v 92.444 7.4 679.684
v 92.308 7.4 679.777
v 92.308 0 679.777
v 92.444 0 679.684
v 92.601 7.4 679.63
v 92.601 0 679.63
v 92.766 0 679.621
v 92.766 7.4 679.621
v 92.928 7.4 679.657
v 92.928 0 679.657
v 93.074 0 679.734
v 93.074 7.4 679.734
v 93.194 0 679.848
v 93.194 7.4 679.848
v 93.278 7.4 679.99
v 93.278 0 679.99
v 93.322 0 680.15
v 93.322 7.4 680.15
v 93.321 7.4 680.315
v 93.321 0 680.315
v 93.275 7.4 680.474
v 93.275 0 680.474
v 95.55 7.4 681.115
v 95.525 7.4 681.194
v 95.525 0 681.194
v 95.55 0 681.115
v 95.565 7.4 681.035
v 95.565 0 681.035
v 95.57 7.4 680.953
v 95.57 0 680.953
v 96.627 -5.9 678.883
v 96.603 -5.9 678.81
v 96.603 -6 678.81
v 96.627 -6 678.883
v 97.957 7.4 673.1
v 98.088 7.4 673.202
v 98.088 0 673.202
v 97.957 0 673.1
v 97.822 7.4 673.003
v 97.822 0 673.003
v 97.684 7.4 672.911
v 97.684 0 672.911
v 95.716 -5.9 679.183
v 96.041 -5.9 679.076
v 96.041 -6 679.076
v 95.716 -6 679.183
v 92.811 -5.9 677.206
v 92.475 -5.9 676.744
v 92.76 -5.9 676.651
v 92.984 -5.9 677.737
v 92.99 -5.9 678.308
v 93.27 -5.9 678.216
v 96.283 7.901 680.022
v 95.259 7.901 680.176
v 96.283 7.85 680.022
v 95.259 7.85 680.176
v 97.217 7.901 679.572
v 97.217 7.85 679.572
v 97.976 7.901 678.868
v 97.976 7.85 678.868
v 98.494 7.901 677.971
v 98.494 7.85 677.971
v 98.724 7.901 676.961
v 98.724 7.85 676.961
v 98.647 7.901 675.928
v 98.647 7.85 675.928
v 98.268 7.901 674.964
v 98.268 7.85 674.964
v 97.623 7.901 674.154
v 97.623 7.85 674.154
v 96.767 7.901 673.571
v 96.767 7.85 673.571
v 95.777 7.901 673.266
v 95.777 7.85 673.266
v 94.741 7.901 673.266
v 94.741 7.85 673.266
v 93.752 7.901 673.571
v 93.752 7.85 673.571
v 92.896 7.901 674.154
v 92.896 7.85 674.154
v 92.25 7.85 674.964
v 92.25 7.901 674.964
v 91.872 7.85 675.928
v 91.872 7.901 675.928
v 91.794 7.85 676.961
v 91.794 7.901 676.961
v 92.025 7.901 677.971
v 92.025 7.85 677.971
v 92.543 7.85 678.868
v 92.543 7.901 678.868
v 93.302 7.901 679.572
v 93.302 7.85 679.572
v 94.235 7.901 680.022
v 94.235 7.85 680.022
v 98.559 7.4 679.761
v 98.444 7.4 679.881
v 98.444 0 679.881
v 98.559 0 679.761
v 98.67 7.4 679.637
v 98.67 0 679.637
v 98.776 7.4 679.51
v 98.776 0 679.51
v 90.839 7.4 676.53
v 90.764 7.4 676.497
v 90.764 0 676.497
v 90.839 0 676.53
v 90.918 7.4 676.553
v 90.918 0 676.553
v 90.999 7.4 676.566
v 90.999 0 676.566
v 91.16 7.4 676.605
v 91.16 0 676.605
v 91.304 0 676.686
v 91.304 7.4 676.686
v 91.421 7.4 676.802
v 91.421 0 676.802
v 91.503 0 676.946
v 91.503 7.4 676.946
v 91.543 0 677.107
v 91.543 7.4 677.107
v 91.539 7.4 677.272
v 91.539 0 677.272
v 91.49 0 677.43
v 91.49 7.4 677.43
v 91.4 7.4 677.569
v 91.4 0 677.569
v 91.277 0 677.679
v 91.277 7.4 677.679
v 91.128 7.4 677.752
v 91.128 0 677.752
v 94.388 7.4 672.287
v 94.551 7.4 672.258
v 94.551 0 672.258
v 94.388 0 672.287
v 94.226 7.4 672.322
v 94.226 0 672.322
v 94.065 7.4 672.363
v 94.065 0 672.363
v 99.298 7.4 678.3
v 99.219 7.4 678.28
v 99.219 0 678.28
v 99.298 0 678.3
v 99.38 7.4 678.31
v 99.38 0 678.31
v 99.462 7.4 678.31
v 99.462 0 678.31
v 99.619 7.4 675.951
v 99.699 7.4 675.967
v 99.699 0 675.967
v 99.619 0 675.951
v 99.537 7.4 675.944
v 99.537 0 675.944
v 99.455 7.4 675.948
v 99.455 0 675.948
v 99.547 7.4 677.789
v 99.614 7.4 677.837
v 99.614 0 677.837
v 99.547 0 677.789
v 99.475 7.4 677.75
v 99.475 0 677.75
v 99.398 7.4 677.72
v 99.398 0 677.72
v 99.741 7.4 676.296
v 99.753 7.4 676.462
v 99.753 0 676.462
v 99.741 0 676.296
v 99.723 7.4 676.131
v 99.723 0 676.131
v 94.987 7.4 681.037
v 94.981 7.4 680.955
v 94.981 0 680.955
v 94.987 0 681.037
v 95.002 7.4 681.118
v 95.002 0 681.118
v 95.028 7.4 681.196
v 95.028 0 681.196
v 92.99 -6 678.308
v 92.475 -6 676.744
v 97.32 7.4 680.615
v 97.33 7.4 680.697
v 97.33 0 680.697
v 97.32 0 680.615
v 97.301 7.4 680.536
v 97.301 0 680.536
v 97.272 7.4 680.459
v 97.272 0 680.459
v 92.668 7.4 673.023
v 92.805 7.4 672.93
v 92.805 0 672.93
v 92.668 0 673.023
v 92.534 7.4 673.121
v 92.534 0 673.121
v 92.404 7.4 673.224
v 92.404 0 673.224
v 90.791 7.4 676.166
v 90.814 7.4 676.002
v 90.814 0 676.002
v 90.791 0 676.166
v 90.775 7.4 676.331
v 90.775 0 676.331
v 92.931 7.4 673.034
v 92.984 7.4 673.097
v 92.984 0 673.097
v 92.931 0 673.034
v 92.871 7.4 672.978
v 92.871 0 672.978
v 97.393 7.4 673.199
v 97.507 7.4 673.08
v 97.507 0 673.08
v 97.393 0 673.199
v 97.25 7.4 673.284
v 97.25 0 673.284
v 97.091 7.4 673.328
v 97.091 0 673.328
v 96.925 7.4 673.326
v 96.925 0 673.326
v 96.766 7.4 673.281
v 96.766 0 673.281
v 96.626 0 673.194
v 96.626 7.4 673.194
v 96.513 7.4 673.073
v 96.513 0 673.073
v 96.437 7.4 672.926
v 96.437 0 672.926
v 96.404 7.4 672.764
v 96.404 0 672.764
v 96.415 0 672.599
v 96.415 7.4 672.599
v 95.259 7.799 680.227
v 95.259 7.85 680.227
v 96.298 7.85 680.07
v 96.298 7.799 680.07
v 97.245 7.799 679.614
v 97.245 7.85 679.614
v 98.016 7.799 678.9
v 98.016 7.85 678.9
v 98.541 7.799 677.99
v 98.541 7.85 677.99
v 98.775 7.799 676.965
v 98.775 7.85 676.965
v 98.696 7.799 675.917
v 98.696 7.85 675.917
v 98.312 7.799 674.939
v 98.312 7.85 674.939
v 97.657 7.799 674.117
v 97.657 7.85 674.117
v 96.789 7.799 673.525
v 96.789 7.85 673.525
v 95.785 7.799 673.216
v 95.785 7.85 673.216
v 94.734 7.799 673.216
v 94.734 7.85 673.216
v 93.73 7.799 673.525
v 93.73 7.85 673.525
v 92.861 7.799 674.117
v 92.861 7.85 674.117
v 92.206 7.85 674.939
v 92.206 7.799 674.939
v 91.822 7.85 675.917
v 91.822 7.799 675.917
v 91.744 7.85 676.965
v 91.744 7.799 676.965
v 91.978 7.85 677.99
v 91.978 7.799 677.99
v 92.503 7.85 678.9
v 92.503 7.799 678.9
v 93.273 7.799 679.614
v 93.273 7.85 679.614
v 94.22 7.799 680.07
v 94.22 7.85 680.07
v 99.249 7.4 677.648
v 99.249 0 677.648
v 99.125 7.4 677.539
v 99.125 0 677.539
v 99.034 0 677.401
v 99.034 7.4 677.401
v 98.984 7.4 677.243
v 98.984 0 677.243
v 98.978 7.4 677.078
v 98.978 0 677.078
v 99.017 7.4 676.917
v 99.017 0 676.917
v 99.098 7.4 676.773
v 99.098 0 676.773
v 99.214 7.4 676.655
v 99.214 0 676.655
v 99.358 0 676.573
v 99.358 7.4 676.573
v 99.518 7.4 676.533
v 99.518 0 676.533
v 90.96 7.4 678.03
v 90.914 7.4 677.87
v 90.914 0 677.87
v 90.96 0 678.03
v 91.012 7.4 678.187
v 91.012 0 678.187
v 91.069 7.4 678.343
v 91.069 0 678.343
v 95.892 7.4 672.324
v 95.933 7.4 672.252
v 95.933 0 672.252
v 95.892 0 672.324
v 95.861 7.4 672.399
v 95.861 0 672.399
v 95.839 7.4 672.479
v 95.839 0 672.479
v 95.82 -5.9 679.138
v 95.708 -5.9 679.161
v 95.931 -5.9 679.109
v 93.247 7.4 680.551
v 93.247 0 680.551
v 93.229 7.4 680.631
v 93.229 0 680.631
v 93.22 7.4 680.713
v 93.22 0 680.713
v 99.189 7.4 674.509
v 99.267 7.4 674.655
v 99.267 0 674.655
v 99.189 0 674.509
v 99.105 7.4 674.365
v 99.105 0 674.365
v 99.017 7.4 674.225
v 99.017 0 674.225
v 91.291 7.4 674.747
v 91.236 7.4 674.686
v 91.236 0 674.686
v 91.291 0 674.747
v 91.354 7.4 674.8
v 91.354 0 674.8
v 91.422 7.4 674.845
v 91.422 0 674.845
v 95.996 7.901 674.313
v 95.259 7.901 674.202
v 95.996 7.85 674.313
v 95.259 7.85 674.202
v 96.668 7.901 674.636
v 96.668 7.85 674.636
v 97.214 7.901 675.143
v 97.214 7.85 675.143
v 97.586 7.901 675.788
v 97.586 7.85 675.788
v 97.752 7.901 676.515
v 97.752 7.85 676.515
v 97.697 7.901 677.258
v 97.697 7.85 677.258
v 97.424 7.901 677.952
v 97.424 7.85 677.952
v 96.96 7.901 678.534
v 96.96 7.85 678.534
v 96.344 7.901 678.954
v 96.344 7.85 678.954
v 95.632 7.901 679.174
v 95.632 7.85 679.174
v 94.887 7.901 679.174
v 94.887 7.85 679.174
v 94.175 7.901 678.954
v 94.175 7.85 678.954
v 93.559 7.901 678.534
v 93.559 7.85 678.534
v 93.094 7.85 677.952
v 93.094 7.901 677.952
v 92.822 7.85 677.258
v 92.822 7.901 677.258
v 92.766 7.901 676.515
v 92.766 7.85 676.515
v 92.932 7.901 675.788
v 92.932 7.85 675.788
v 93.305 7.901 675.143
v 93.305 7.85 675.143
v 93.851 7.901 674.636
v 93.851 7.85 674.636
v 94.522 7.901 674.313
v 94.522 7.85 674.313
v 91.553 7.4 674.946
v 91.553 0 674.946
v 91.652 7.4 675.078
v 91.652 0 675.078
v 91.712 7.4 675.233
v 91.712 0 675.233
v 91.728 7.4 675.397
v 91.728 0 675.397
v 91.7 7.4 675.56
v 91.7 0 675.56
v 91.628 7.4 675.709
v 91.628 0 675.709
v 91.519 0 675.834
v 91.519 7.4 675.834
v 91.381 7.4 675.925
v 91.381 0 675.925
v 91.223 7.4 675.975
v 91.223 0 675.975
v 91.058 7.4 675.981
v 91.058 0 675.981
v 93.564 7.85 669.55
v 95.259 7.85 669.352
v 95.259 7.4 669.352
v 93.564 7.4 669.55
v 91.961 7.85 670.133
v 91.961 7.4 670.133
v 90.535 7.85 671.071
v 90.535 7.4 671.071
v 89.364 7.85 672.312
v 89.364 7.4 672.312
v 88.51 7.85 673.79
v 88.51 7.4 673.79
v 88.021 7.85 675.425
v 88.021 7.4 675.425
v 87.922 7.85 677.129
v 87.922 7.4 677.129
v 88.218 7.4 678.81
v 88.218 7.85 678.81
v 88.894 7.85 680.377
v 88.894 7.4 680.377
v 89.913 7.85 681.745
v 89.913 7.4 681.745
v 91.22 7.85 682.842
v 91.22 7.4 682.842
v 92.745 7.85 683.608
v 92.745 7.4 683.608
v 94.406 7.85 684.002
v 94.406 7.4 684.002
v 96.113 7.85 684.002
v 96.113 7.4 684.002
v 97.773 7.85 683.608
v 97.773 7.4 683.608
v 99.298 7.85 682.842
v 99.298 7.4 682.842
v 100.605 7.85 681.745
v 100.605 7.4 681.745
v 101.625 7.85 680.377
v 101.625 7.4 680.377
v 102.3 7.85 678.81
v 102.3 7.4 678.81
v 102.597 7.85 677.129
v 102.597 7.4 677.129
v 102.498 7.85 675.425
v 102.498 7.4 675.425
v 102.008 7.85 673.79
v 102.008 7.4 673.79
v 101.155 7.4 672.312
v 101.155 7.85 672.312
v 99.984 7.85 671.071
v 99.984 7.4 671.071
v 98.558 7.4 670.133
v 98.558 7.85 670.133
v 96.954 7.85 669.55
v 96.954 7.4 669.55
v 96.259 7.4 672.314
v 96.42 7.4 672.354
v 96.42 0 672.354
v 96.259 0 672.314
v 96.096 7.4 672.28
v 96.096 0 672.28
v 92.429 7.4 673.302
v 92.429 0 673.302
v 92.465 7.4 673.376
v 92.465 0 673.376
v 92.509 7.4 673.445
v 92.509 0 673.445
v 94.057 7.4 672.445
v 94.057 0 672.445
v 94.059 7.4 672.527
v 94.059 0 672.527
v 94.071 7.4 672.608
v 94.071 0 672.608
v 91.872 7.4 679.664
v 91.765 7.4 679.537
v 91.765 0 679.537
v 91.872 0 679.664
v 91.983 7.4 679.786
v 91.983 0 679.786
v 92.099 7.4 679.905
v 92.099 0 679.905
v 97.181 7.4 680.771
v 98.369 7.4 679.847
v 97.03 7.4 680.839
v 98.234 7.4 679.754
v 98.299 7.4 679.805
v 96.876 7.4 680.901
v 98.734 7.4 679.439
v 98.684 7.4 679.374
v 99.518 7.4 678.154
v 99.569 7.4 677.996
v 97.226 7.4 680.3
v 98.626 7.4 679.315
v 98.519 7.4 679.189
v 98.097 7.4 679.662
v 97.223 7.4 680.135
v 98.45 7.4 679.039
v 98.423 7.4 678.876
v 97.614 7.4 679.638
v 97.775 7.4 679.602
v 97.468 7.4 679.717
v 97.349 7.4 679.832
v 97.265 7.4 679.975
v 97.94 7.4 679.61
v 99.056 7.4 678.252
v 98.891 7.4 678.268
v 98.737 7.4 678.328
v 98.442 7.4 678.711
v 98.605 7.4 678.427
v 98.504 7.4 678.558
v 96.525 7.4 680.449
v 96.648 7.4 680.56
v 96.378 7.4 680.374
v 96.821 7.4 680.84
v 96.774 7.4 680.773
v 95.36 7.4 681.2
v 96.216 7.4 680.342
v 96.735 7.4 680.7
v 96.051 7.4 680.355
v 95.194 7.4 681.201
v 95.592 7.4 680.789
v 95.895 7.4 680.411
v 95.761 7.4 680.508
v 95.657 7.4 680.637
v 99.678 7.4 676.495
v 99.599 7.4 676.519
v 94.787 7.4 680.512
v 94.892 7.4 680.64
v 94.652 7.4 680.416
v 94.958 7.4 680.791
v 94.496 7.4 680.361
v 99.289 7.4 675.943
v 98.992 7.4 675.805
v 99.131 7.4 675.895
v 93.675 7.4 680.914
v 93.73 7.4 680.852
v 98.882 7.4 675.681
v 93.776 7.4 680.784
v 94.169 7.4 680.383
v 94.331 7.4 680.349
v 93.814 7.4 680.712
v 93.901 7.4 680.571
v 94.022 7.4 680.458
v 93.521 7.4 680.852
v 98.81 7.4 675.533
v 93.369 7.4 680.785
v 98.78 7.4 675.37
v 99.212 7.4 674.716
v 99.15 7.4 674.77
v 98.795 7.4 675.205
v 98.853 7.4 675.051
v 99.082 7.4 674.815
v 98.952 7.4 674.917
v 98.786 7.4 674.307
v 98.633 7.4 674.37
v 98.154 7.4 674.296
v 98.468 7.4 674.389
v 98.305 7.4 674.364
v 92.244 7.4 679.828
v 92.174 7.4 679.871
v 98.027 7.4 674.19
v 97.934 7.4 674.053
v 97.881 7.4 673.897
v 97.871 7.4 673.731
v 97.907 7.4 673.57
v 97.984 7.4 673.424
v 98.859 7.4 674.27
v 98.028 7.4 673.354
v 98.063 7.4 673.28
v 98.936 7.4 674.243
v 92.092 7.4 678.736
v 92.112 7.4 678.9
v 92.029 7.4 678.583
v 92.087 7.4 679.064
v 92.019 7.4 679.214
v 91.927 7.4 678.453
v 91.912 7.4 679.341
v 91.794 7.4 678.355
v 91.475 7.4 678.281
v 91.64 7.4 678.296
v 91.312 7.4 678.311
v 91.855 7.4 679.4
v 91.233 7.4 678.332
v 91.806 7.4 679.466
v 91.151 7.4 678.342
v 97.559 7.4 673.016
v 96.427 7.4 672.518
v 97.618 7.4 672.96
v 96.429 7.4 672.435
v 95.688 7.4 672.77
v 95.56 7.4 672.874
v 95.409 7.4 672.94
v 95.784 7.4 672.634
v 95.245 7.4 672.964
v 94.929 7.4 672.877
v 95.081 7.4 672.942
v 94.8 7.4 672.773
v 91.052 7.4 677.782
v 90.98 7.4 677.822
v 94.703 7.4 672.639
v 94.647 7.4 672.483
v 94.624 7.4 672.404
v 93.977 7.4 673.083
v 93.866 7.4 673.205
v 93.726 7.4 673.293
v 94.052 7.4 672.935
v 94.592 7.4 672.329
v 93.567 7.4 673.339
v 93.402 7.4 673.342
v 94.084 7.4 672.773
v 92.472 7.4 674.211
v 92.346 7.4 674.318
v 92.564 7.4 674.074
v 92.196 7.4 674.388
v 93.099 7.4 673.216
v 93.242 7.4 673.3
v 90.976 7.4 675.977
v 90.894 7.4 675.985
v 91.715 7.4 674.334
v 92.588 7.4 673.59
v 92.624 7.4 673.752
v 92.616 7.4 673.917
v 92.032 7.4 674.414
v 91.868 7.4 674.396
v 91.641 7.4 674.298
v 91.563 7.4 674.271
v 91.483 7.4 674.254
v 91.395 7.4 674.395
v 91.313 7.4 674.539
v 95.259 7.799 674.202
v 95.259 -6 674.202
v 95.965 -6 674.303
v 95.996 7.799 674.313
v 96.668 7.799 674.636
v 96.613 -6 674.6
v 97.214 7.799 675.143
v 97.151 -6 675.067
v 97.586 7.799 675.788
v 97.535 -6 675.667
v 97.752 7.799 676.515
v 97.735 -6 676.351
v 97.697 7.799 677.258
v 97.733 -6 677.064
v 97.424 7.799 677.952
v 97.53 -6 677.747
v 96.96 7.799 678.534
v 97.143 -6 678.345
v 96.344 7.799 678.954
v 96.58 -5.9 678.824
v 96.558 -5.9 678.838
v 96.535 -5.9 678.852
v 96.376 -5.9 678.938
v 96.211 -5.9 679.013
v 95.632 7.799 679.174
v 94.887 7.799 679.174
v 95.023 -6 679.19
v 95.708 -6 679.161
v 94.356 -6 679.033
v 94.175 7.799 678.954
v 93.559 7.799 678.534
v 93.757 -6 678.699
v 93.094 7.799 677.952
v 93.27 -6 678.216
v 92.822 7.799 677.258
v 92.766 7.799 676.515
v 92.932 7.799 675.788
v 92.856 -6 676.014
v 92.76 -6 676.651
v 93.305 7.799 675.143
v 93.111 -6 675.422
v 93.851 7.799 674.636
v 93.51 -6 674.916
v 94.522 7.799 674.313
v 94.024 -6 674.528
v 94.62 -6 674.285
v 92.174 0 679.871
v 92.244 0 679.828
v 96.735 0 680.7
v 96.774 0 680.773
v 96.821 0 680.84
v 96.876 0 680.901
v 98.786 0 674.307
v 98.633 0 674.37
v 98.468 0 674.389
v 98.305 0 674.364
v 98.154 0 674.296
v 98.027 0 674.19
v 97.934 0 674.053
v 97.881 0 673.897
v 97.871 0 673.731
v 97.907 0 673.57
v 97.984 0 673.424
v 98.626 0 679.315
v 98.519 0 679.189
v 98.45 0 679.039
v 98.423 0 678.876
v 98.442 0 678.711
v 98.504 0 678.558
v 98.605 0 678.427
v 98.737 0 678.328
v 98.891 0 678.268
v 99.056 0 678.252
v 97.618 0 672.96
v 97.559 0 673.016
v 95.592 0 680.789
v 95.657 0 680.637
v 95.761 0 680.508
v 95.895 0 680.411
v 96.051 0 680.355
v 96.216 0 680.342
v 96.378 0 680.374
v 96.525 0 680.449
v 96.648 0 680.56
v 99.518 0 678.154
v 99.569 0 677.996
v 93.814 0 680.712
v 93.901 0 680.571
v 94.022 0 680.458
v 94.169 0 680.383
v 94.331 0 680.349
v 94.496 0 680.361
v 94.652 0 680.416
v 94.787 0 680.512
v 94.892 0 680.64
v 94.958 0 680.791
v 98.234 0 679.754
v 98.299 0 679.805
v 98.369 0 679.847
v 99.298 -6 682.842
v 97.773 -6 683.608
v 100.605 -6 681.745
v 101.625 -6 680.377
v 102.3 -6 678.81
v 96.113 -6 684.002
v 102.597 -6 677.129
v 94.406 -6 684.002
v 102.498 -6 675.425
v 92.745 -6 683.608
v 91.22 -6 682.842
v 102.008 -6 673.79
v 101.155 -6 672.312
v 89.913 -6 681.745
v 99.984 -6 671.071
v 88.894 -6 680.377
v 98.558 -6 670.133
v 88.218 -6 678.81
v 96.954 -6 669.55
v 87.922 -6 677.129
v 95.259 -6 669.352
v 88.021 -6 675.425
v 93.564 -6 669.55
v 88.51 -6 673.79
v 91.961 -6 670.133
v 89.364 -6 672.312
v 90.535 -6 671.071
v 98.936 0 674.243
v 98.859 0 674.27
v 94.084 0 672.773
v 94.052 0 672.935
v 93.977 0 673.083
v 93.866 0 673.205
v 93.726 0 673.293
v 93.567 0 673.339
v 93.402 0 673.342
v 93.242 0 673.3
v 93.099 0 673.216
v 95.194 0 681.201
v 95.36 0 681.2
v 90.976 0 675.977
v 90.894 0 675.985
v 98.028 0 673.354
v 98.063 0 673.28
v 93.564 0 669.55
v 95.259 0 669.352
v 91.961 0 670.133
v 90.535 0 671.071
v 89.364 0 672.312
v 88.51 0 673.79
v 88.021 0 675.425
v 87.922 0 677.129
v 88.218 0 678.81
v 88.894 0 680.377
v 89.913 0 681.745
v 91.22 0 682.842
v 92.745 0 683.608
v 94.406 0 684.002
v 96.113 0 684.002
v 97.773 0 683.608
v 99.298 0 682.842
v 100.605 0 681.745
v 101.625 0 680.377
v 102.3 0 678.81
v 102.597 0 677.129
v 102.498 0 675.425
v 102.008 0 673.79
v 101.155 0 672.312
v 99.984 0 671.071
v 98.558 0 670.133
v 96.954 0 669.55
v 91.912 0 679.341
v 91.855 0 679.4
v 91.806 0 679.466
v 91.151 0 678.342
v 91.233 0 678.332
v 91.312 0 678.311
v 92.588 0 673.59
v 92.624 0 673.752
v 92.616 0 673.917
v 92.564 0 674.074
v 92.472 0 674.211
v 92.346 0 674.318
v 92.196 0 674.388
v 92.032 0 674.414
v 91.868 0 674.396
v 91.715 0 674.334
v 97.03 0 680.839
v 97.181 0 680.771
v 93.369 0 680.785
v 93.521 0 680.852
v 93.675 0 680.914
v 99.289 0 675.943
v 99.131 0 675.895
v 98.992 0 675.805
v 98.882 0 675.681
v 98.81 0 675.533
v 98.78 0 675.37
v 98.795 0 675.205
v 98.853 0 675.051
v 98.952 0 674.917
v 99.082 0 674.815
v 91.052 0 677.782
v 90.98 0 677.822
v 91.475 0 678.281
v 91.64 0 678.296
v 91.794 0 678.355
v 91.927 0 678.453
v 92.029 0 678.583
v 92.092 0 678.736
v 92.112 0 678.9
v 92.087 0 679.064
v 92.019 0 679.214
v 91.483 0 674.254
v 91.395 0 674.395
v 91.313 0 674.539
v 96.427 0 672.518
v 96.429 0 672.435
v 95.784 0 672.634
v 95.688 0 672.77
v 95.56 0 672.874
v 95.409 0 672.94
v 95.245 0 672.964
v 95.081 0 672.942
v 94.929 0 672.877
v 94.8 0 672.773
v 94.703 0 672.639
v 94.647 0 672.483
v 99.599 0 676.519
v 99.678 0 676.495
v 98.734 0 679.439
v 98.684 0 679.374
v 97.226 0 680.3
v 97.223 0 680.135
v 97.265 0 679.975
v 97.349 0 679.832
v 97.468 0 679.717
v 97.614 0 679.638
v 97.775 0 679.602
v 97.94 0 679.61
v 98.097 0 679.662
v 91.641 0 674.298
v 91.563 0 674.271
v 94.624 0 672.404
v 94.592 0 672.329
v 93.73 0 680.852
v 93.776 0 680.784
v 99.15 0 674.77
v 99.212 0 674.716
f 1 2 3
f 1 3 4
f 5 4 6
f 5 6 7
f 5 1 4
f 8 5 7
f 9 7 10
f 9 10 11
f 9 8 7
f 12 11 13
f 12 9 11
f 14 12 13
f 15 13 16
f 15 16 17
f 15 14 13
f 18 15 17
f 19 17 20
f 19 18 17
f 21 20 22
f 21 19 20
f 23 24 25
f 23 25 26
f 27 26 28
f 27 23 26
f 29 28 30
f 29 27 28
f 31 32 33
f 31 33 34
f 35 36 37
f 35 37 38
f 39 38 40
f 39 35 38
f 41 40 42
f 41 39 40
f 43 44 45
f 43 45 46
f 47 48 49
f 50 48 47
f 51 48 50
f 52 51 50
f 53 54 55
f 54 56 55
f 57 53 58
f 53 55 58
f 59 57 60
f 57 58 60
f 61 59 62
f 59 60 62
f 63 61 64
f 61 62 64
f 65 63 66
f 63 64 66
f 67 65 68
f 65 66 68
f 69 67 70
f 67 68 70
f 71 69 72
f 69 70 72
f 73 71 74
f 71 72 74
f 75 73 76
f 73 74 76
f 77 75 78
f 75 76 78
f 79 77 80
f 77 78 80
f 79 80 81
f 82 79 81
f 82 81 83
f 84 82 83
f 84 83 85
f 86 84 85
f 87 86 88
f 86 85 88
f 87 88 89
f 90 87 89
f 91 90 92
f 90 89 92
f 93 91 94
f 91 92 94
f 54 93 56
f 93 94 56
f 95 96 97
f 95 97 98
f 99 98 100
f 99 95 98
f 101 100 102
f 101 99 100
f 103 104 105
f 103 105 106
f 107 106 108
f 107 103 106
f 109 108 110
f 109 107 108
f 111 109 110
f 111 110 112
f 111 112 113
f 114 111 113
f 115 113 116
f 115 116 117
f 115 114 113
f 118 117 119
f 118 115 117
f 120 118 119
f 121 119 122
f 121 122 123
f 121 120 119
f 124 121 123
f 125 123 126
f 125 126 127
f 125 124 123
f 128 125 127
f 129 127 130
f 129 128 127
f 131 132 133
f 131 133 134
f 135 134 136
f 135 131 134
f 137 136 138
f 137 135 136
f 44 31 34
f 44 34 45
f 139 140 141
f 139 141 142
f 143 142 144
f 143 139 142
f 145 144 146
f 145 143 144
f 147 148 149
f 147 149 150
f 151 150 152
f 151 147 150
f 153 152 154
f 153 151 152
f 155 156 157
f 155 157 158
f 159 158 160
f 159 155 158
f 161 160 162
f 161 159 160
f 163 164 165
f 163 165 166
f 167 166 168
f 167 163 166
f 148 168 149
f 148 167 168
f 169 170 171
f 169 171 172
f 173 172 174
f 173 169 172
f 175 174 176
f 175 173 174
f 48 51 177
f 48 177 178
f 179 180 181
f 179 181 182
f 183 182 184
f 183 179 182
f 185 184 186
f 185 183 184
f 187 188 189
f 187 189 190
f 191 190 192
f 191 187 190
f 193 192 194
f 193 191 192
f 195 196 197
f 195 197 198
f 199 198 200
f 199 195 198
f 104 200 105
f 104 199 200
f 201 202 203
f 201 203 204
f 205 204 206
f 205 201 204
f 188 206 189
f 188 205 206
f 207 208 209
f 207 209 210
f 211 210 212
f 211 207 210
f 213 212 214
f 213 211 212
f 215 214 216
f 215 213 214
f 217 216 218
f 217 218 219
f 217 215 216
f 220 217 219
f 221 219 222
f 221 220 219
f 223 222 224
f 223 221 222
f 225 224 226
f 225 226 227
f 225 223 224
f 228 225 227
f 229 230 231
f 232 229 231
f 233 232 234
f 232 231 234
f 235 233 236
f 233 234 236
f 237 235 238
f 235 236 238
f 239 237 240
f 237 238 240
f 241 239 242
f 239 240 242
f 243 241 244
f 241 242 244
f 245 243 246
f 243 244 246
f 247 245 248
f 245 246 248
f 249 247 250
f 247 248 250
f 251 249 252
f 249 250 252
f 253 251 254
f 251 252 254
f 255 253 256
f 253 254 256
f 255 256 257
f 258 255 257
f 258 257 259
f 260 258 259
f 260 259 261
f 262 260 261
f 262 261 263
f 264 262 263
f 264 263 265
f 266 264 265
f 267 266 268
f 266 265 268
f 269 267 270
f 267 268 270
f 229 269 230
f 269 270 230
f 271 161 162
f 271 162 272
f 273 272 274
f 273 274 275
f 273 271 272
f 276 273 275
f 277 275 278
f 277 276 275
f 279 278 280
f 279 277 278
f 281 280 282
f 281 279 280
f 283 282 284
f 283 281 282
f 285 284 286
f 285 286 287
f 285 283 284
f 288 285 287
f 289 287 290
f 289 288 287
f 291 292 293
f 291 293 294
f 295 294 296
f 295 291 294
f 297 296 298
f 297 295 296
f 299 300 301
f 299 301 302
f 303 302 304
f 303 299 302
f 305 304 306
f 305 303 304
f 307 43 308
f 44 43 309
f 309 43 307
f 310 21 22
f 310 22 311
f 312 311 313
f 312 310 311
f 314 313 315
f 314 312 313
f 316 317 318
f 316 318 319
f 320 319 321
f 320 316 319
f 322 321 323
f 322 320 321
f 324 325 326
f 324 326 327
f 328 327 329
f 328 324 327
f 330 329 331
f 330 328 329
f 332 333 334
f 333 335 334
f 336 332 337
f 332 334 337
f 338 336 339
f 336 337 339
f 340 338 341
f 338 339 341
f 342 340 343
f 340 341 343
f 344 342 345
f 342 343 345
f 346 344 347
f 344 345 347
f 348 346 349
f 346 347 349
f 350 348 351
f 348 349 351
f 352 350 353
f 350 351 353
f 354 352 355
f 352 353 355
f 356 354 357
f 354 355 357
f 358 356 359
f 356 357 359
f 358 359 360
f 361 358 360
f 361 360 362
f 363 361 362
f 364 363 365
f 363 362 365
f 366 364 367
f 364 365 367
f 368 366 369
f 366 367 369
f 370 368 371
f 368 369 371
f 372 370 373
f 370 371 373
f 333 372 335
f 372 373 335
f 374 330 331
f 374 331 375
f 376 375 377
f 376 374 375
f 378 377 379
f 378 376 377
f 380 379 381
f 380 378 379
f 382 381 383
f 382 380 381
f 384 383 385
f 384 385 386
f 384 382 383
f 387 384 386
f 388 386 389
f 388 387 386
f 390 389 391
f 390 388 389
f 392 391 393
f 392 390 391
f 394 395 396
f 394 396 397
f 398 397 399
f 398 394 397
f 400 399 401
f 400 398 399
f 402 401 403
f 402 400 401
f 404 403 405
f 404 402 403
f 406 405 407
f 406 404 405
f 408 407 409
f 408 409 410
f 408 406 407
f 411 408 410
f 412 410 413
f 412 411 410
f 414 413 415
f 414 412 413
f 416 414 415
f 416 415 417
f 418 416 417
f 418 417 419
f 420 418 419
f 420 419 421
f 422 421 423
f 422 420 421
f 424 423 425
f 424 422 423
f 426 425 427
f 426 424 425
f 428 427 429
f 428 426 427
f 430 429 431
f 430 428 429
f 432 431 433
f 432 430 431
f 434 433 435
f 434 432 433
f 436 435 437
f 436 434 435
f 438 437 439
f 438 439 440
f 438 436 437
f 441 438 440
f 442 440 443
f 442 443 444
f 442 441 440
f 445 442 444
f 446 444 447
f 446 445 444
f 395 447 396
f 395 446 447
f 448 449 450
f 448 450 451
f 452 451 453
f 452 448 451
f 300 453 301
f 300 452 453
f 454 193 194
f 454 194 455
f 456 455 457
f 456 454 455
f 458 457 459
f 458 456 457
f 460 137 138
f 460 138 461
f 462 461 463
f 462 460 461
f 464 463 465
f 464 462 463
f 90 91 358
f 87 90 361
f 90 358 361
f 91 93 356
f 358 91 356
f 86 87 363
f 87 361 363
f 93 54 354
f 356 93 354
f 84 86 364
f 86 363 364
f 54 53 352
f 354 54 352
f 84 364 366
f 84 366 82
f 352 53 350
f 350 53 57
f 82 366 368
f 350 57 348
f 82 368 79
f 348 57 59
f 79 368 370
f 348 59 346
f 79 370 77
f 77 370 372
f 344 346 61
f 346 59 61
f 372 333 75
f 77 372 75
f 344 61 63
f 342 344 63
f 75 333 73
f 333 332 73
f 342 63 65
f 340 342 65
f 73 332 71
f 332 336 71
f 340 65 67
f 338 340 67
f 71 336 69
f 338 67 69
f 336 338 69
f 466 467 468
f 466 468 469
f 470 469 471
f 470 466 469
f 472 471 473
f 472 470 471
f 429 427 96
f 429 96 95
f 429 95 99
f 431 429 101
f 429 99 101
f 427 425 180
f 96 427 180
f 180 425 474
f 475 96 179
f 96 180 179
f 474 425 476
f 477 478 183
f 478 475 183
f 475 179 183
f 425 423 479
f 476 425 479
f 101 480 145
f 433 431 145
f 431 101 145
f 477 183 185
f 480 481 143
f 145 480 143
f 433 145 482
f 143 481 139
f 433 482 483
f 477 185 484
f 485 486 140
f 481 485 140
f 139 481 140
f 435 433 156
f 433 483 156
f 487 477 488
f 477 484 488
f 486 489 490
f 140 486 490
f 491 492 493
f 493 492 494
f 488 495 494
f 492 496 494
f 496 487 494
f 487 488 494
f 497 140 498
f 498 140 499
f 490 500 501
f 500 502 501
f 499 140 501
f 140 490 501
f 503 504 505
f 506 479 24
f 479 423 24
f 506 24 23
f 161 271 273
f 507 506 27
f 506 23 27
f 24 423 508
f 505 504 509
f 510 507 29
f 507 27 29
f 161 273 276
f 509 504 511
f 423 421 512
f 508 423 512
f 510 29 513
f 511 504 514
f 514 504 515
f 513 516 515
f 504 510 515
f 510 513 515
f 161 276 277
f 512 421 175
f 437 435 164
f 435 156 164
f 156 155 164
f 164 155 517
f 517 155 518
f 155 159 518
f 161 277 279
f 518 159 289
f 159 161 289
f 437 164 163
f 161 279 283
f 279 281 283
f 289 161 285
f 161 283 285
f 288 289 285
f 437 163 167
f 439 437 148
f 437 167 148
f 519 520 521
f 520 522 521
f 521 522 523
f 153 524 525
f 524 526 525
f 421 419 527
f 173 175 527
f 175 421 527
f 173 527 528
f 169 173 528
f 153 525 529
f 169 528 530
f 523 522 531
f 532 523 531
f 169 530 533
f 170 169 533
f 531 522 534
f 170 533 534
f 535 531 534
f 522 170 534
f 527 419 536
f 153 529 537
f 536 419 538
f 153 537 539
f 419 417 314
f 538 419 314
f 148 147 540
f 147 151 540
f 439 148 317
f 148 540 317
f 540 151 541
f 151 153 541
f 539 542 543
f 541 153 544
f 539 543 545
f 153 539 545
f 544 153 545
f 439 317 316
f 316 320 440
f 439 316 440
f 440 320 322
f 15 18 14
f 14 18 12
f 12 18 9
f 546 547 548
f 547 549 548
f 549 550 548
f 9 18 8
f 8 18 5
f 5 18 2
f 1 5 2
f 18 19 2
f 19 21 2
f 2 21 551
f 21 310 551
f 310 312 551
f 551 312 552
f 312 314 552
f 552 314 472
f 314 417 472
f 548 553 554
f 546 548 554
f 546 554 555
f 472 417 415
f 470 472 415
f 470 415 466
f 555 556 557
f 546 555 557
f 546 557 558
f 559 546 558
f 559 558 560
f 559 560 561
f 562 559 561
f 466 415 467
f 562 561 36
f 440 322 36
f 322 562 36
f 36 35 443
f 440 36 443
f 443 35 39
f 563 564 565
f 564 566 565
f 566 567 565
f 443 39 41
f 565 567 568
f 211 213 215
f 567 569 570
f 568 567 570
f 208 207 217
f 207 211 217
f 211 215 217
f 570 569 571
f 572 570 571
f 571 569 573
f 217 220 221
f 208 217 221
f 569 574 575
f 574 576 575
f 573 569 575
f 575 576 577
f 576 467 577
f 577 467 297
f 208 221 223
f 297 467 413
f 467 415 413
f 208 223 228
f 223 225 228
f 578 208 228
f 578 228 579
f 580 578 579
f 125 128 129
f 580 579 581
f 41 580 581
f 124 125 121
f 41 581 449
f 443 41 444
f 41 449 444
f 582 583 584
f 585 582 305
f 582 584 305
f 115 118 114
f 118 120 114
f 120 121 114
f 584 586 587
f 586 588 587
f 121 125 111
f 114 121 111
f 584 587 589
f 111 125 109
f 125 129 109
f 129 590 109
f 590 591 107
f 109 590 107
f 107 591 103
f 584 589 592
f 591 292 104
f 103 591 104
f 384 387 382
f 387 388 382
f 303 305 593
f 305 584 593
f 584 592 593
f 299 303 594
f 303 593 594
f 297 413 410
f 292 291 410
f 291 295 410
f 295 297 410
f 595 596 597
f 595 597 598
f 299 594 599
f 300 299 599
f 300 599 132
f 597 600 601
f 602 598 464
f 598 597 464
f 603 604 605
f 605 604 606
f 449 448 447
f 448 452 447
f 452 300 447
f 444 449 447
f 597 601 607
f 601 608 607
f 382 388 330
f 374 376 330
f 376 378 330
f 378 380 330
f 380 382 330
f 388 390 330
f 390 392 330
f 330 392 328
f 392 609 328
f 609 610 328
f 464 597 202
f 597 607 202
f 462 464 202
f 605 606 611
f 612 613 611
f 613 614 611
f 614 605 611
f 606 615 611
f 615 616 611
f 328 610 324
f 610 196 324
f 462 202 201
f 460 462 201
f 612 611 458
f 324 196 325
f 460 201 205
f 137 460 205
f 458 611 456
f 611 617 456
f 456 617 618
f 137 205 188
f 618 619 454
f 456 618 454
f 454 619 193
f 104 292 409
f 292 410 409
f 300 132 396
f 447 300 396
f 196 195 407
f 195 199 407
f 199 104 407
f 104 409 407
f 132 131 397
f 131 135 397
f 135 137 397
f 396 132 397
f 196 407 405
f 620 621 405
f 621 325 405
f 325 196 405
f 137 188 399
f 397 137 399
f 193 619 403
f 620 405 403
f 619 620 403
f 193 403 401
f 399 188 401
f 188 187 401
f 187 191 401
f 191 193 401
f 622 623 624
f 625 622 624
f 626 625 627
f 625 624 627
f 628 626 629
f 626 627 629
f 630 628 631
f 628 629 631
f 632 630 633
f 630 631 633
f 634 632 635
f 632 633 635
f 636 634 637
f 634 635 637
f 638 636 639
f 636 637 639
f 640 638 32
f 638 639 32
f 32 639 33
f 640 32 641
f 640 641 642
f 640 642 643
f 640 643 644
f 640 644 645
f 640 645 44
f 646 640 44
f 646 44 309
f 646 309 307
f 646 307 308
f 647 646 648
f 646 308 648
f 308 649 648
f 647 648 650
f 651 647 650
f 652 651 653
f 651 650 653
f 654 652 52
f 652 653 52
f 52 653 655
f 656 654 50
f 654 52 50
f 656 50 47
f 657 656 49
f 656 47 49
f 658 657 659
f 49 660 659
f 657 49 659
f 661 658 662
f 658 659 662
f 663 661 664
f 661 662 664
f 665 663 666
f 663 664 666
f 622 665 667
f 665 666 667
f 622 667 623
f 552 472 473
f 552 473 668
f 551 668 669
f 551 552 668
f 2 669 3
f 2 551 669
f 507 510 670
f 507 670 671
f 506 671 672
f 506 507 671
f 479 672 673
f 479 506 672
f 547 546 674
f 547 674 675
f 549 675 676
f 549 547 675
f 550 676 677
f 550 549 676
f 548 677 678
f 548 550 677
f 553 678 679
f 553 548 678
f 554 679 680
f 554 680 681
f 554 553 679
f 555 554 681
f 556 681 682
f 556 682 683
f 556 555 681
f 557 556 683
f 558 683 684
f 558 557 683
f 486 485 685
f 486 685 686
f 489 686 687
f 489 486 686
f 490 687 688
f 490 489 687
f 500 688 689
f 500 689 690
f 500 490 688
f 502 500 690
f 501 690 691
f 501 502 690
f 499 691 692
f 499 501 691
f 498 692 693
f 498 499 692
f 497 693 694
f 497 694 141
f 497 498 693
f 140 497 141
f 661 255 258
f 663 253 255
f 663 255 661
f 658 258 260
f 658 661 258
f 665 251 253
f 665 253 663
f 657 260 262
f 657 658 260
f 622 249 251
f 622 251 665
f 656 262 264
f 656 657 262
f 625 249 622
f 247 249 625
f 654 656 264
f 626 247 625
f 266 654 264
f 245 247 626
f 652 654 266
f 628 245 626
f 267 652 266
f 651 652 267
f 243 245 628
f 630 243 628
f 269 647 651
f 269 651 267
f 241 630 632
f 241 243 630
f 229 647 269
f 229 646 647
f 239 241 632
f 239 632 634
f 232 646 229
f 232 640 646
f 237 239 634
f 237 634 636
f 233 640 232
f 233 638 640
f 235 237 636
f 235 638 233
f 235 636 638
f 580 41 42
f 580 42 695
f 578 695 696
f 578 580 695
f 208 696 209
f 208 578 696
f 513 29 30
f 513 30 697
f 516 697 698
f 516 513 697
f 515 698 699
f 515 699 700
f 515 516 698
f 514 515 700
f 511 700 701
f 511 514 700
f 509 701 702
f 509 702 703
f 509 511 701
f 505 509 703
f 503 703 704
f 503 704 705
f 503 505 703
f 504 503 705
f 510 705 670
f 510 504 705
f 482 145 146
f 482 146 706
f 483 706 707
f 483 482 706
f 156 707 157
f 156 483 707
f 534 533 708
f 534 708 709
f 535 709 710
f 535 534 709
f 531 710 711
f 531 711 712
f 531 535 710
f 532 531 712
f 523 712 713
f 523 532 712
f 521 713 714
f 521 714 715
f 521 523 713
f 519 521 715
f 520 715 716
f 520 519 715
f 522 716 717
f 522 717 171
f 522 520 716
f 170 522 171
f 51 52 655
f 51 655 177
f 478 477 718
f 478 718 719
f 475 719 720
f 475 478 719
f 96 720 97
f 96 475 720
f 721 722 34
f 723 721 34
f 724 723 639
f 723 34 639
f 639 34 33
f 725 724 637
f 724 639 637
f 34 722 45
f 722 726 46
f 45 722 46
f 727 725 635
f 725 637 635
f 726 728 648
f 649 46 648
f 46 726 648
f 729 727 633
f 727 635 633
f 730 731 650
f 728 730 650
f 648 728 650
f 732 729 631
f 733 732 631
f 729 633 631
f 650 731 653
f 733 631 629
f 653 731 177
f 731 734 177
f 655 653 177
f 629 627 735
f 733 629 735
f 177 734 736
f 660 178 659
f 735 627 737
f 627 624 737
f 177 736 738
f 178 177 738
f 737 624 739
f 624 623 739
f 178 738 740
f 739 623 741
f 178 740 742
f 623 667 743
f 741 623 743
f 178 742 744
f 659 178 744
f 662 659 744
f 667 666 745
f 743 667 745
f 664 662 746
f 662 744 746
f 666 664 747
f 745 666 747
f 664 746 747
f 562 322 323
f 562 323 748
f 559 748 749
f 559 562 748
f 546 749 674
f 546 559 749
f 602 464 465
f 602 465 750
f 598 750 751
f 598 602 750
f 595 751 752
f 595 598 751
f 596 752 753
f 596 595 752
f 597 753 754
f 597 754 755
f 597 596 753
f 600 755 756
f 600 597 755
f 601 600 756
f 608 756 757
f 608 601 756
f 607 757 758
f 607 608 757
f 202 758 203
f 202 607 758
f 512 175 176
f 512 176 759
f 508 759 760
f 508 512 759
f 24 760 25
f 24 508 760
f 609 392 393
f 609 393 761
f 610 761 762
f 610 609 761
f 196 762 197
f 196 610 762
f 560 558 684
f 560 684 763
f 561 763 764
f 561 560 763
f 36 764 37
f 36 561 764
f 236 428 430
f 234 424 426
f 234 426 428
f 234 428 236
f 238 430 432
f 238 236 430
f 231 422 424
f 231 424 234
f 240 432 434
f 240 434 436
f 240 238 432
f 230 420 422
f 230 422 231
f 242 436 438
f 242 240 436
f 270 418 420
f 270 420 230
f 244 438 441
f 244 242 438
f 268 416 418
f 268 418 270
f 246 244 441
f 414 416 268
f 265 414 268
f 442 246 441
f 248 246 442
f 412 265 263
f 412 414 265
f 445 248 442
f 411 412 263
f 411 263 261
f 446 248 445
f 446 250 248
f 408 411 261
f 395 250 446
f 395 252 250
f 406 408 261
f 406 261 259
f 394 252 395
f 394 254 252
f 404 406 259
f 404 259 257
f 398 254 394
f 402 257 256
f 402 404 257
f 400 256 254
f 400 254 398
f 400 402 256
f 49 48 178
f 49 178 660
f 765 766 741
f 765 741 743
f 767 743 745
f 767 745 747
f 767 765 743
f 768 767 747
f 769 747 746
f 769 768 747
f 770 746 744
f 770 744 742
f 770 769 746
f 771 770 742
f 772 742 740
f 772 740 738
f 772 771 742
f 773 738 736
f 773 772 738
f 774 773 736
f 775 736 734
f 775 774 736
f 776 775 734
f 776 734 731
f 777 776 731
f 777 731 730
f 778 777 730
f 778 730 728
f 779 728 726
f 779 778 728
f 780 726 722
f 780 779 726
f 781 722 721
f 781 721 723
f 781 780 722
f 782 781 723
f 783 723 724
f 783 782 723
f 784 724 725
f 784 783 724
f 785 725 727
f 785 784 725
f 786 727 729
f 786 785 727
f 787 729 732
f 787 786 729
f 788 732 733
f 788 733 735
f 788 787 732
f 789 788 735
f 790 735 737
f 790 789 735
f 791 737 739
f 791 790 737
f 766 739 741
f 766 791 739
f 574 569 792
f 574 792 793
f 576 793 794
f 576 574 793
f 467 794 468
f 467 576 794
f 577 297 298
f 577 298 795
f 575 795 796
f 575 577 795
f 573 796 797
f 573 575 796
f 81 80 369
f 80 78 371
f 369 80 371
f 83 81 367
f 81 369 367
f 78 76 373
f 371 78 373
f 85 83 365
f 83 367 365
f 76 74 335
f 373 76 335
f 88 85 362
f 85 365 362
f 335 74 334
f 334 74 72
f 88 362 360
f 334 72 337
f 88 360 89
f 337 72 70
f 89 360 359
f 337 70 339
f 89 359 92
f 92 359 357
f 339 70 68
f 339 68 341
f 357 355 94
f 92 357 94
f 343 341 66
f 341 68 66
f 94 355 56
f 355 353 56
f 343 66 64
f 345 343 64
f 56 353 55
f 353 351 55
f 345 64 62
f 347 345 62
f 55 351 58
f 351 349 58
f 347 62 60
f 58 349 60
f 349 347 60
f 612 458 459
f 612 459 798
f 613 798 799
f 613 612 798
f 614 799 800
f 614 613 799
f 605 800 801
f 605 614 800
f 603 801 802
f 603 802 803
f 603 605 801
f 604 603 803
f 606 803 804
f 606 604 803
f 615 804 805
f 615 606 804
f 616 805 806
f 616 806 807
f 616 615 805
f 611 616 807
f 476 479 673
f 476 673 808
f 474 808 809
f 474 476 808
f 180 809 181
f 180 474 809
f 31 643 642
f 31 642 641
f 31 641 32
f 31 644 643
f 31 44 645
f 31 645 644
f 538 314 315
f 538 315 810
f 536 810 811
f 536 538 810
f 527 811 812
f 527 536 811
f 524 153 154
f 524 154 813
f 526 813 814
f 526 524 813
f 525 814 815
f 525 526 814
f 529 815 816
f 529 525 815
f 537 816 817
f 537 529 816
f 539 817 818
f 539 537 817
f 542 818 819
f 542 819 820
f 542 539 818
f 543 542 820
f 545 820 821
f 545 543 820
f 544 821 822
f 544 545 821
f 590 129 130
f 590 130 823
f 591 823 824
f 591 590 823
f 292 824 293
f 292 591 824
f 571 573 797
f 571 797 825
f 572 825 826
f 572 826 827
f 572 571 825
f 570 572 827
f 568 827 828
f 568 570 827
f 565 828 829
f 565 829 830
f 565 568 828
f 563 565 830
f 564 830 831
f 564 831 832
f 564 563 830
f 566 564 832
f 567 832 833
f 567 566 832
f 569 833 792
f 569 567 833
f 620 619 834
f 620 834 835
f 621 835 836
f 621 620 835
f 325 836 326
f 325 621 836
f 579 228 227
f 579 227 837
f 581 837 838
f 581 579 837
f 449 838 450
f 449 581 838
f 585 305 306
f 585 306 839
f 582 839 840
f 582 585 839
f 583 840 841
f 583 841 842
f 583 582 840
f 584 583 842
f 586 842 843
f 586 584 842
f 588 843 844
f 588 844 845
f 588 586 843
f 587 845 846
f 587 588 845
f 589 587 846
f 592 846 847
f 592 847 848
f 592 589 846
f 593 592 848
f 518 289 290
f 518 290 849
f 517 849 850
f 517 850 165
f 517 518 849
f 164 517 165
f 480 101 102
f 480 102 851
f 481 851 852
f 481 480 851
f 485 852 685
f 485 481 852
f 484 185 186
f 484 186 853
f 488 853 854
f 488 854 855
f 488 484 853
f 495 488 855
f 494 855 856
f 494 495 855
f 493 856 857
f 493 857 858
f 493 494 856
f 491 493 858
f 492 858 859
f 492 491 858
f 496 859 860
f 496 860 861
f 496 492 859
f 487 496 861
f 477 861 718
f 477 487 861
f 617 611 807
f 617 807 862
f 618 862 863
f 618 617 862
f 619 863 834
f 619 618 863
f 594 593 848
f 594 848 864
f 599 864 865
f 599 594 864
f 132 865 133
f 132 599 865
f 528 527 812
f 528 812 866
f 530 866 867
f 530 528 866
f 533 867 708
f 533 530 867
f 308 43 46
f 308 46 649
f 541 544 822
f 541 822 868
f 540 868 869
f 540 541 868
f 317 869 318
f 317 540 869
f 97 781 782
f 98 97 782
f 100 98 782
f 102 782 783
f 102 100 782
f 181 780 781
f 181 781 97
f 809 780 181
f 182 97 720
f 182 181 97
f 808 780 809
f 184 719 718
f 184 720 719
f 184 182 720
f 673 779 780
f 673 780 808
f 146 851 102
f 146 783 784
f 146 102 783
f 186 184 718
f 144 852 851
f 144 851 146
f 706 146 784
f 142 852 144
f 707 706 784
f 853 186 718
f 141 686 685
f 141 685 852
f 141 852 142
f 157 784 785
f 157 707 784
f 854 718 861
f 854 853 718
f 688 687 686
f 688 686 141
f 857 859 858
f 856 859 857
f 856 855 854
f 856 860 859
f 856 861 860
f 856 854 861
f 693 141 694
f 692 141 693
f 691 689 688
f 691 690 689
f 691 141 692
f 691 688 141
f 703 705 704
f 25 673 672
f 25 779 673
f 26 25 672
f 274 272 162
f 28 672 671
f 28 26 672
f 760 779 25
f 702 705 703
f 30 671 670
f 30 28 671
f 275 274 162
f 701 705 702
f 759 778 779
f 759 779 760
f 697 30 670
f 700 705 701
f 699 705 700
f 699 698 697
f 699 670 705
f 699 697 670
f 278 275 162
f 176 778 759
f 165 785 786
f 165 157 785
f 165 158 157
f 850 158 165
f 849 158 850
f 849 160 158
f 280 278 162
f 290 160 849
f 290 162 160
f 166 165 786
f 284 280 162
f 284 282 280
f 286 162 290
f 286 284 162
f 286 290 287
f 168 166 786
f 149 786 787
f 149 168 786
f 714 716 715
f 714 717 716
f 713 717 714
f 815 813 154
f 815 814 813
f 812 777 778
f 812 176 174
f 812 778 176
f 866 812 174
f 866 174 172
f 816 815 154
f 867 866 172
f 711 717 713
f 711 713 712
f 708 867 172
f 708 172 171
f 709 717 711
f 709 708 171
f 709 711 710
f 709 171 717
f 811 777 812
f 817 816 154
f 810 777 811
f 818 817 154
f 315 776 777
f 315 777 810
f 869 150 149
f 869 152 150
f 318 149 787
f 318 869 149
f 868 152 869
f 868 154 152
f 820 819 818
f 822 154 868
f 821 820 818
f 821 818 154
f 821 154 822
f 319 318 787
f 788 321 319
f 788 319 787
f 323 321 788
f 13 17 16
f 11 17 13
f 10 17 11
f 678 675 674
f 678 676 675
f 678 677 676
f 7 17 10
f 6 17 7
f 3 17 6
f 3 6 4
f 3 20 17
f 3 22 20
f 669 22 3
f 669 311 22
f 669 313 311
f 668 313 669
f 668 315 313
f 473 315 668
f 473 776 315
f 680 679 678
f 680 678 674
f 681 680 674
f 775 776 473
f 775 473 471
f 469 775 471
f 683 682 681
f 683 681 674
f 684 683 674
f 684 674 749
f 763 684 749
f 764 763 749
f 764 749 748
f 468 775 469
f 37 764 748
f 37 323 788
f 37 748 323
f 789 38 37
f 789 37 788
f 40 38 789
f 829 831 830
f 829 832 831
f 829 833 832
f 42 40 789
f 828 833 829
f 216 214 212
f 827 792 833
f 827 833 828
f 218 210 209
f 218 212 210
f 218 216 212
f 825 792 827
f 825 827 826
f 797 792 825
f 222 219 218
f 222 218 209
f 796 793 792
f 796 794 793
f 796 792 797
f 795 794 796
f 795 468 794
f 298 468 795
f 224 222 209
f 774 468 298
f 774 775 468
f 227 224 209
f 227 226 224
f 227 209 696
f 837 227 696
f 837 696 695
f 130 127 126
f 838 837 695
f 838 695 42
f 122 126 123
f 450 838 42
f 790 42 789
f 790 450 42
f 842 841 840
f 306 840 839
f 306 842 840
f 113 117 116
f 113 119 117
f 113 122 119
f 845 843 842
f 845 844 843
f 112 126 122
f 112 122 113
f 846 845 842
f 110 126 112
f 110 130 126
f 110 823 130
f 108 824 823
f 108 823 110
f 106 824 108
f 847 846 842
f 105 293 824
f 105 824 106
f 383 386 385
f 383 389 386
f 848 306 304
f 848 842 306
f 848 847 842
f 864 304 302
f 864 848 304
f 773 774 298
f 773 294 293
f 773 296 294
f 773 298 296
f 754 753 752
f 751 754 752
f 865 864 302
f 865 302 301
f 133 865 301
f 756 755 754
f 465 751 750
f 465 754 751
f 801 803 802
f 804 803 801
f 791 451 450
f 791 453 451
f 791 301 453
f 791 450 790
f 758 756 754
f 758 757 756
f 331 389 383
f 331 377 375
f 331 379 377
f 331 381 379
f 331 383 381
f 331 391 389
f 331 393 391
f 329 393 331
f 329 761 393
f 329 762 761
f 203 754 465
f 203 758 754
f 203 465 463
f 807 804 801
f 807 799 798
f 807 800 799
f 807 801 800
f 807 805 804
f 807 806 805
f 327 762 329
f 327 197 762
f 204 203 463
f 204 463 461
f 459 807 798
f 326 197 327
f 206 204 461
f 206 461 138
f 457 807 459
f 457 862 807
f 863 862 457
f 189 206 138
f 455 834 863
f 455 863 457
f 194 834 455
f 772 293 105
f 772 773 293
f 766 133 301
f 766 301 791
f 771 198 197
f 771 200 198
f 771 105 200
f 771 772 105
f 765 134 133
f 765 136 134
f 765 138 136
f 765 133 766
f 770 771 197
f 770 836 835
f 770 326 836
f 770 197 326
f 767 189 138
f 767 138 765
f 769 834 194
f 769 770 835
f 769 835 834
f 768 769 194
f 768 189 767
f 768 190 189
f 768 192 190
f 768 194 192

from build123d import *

# Parameters (mm, degrees)
BOSS_EXTRUDE1_DEPTH = 7.4
SKETCH2_R           = 7.35
BOSS_EXTRUDE2_DEPTH = 6
BOSS_EXTRUDE3_DEPTH = 1.5
CUT_EXTRUDE1_START  = -0.1
CUT_EXTRUDE1_DEPTH  = 0.1
CUT_EXTRUDE2_START  = -1.6
CUT_EXTRUDE2_DEPTH  = 1.6
CUT_EXTRUDE3_START  = -13.4
CUT_EXTRUDE3_DEPTH  = 13.4
CUT_EXTRUDE4_START  = -0.1
CUT_EXTRUDE4_DEPTH  = 0.1
BOSS_EXTRUDE4_START = 0.45
SKETCH8_R           = 7.35
BOSS_EXTRUDE4_DEPTH = 0.45
SKETCH9_R           = 3.5254
CUT_EXTRUDE5_DEPTH  = 0.0508
SKETCH13_R          = 2.5
CUT_EXTRUDE6_DEPTH  = 692.982195909


with BuildPart() as part:
    # Sketch1 → Boss-Extrude1 (new body)
    with BuildSketch(Plane.XZ.offset(-7.4)):
        with BuildLine():
            ThreePointArc((91.128150208, 677.751658944), (91.015370064, 677.800914334), (90.913687093, 677.870239853))
            ThreePointArc((90.913687093, 677.870239853), (90.984932811, 678.108661471), (91.069248689, 678.342780358))
            ThreePointArc((91.069248689, 678.342780358), (91.192228282, 678.338146361), (91.312212717, 678.310775031))
            ThreePointArc((91.312212717, 678.310775031), (92.029327433, 678.583047694), (91.912427908, 679.341150867))
            ThreePointArc((91.912427908, 679.341150867), (91.829432093, 679.432019722), (91.764737305, 679.536709925))
            ThreePointArc((91.764737305, 679.536709925), (91.926798315, 679.725540668), (92.099049433, 679.905124556))
            ThreePointArc((92.099049433, 679.905124556), (92.209512065, 679.850870882), (92.307990377, 679.777063862))
            ThreePointArc((92.307990377, 679.777063862), (93.073850539, 679.734120484), (93.275405848, 680.474229514))
            ThreePointArc((93.275405848, 680.474229514), (93.236545091, 680.590999784), (93.220024803, 680.712952784))
            ThreePointArc((93.220024803, 680.712952784), (93.444879286, 680.8195421), (93.67528186, 680.913539304))
            ThreePointArc((93.67528186, 680.913539304), (93.754127538, 680.819046906), (93.814071933, 680.7115661))
            ThreePointArc((93.814071933, 680.7115661), (94.496253359, 680.360831981), (94.981412759, 680.954975294))
            ThreePointArc((94.981412759, 680.954975294), (94.993406438, 681.077456337), (95.027917159, 681.195585353))
            ThreePointArc((95.027917159, 681.195585353), (95.27668573, 681.201502981), (95.525401062, 681.19366053))
            ThreePointArc((95.525401062, 681.19366053), (95.558996653, 681.075268003), (95.570042201, 680.952697819))
            ThreePointArc((95.570042201, 680.952697819), (96.050589526, 680.354818074), (96.735464548, 680.700262893))
            ThreePointArc((96.735464548, 680.700262893), (96.796238848, 680.807276625), (96.875813359, 680.901156076))
            ThreePointArc((96.875813359, 680.901156076), (97.105481674, 680.805378805), (97.329504623, 680.69705273))
            ThreePointArc((97.329504623, 680.69705273), (97.312041144, 680.575231217), (97.272277968, 680.458765153))
            ThreePointArc((97.272277968, 680.458765153), (97.468100194, 679.717118622), (98.234269726, 679.7541344))
            ThreePointArc((98.234269726, 679.7541344), (98.333316217, 679.827177174), (98.444195363, 679.880574451))
            ThreePointArc((98.444195363, 679.880574451), (98.615051683, 679.69966304), (98.775646647, 679.509583904))
            ThreePointArc((98.775646647, 679.509583904), (98.710143691, 679.405397451), (98.626447207, 679.315173548))
            ThreePointArc((98.626447207, 679.315173548), (98.503684891, 678.557997654), (99.218671261, 678.280184026))
            ThreePointArc((99.218671261, 678.280184026), (99.338863905, 678.306626083), (99.461875675, 678.310308312))
            ThreePointArc((99.461875675, 678.310308312), (99.54437739, 678.075543988), (99.61377604, 677.8365782))
            ThreePointArc((99.61377604, 677.8365782), (99.511559664, 677.768041591), (99.398401753, 677.719660382))
            ThreePointArc((99.398401753, 677.719660382), (98.978281617, 677.077877715), (99.518457184, 676.533271182))
            ThreePointArc((99.518457184, 676.533271182), (99.639013582, 676.50854045), (99.752888122, 676.461870939))
            ThreePointArc((99.752888122, 676.461870939), (99.732769937, 676.213846587), (99.698972616, 675.967313503))
            ThreePointArc((99.698972616, 675.967313503), (99.57771696, 675.946277341), (99.454663654, 675.948104375))
            ThreePointArc((99.454663654, 675.948104375), (98.809828284, 675.53268499), (99.081791786, 674.815452968))
            ThreePointArc((99.081791786, 674.815452968), (99.181866641, 674.743825616), (99.26691401, 674.654873947))
            ThreePointArc((99.26691401, 674.654873947), (99.147654541, 674.43647523), (99.016505113, 674.22500266))
            ThreePointArc((99.016505113, 674.22500266), (98.897176381, 674.255104288), (98.785504714, 674.306823656))
            ThreePointArc((98.785504714, 674.306823656), (98.027452004, 674.189597337), (97.984178482, 673.423755759))
            ThreePointArc((97.984178482, 673.423755759), (98.046467943, 673.317616806), (98.087982677, 673.201763533))
            ThreePointArc((98.087982677, 673.201763533), (97.890202969, 673.050753573), (97.684378362, 672.910907045))
            ThreePointArc((97.684378362, 672.910907045), (97.587609576, 672.986941619), (97.506628594, 673.079610571))
            ThreePointArc((97.506628594, 673.079610571), (96.766432745, 673.280846814), (96.415404583, 672.598816647))
            ThreePointArc((96.415404583, 672.598816647), (96.429138235, 672.476518482), (96.41994206, 672.353795687))
            ThreePointArc((96.41994206, 672.353795687), (96.177840023, 672.296285478), (95.93292918, 672.252245728))
            ThreePointArc((95.93292918, 672.252245728), (95.875452543, 672.361066178), (95.839164593, 672.478661412))
            ThreePointArc((95.839164593, 672.478661412), (95.244812192, 672.963564642), (94.646725348, 672.483275097))
            ThreePointArc((94.646725348, 672.483275097), (94.609528519, 672.365964185), (94.551211537, 672.257591754))
            ThreePointArc((94.551211537, 672.257591754), (94.306648812, 672.303525334), (94.064999043, 672.362907234))
            ThreePointArc((94.064999043, 672.362907234), (94.056752787, 672.485697517), (94.071432386, 672.607885747))
            ThreePointArc((94.071432386, 672.607885747), (93.725692361, 673.292611791), (92.983961485, 673.097109294))
            ThreePointArc((92.983961485, 673.097109294), (92.902265844, 673.005069757), (92.804911591, 672.929786268))
            ThreePointArc((92.804911591, 672.929786268), (92.600175295, 673.071221303), (92.403570041, 673.223757184))
            ThreePointArc((92.403570041, 673.223757184), (92.445980018, 673.339285743), (92.50908893, 673.444939515))
            ThreePointArc((92.50908893, 673.444939515), (92.471742874, 674.21109302), (91.714619971, 674.334181729))
            ThreePointArc((91.714619971, 674.334181729), (91.602551437, 674.283328038), (91.482993348, 674.25415069))
            ThreePointArc((91.482993348, 674.25415069), (91.353484246, 674.466631779), (91.235918342, 674.6859468))
            ThreePointArc((91.235918342, 674.6859468), (91.321651482, 674.774237699), (91.422277602, 674.845088516))
            ThreePointArc((91.422277602, 674.845088516), (91.699782987, 675.560194579), (91.058181486, 675.980591338))
            ThreePointArc((91.058181486, 675.980591338), (90.935117726, 675.979716559), (90.814028481, 676.001690381))
            ThreePointArc((90.814028481, 676.001690381), (90.782139874, 676.248477612), (90.763941532, 676.496650215))
            ThreePointArc((90.763941532, 676.496650215), (90.878173797, 676.542437155), (90.998917955, 676.566234267))
            ThreePointArc((90.998917955, 676.566234267), (91.543291578, 677.106644554), (91.128150208, 677.751658944))
        make_face()
    extrude(amount=BOSS_EXTRUDE1_DEPTH)

    # Sketch2 → Boss-Extrude2 (add)
    with BuildSketch(Plane(origin=(0, 0, 0), x_dir=(1, 0, 0), z_dir=(0, 1, 0))):
        with Locations(Location((95.259274839, -676.701536663, 0), (0, 0, 90))):
            Circle(SKETCH2_R)
    extrude(amount=-BOSS_EXTRUDE2_DEPTH)

    # Sketch3 → Boss-Extrude3 (add)
    with BuildSketch(Plane.XZ.offset(6)):
        with BuildLine():
            Line((96.041010843, 679.076171124), (96.626778532, 678.883334837))
            Line((96.626778532, 678.883334837), (96.602621135, 678.809953303))
            ThreePointArc((96.602621135, 678.809953303), (94.188428595, 674.442490776), (96.041010843, 679.076171124))
        make_face()
    extrude(amount=BOSS_EXTRUDE3_DEPTH)

    # Sketch4 → Cut-Extrude1 (cut)
    with BuildSketch(Plane.XZ.offset(6).offset(CUT_EXTRUDE1_START)):
        with BuildLine():
            Line((93.270250047, 678.216059815), (92.990087847, 678.30828996))
            Line((92.990087847, 678.30828996), (92.475234347, 676.744349121))
            Line((92.475234347, 676.744349121), (92.759792338, 676.650671871))
            ThreePointArc((92.759792338, 676.650671871), (92.882452531, 677.476595188), (93.270250047, 678.216059815))
        make_face()
    extrude(amount=CUT_EXTRUDE1_DEPTH, mode=Mode.SUBTRACT)

    # Sketch5 → Cut-Extrude2 (cut)
    with BuildSketch(Plane.XZ.offset(7.5).offset(CUT_EXTRUDE2_START)):
        with BuildLine():
            Line((96.602621135, 678.809953303), (96.626778532, 678.883334837))
            Line((96.626778532, 678.883334837), (96.041010843, 679.076171124))
            ThreePointArc((96.041010843, 679.076171124), (94.987937535, 679.186768256), (93.983539757, 678.851536663))
            Line((93.983539757, 678.851536663), (96.535009921, 678.851536663))
            ThreePointArc((96.535009921, 678.851536663), (96.568980573, 678.831013334), (96.602621135, 678.809953303))
        make_face()
    extrude(amount=CUT_EXTRUDE2_DEPTH, mode=Mode.SUBTRACT)

    # Sketch6 → Cut-Extrude3 (cut)
    with BuildSketch(Plane.XZ.offset(5.9).offset(CUT_EXTRUDE3_START)):
        with BuildLine():
            Line((93.983539757, 678.851536663), (96.535009921, 678.851536663))
            ThreePointArc((96.535009921, 678.851536663), (95.259274839, 679.201536663), (93.983539757, 678.851536663))
        make_face()
    extrude(amount=CUT_EXTRUDE3_DEPTH, mode=Mode.SUBTRACT)

    # Sketch7 → Cut-Extrude4 (cut)
    with BuildSketch(Plane.XZ.offset(6).offset(CUT_EXTRUDE4_START)):
        with BuildLine():
            Line((96.041010843, 679.076171124), (95.715643525, 679.183282914))
            Line((95.715643525, 679.183282914), (95.708270643, 679.160886734))
            ThreePointArc((95.708270643, 679.160886734), (95.876096839, 679.124248083), (96.041010843, 679.076171124))
        make_face()
    extrude(amount=CUT_EXTRUDE4_DEPTH, mode=Mode.SUBTRACT)

    # Sketch8 → Boss-Extrude4 (add)
    with BuildSketch(Plane(origin=(0, 7.4, 0), x_dir=(-1, 0, 0), z_dir=(0, 1, 0)).offset(BOSS_EXTRUDE4_START)):
        with Locations(Location((-95.259274839, 676.701536663, 0), (0, 0, 270))):
            Circle(SKETCH8_R)
    extrude(amount=-BOSS_EXTRUDE4_DEPTH)

    # Sketch9 → Cut-Extrude5 (cut)
    with BuildSketch(Plane(origin=(0, 7.85, 0), x_dir=(1, 0, 0), z_dir=(0, 1, 0))):
        with Locations(Location((95.259274839, -676.701536663, 0), (0, 0, 270))):
            Circle(SKETCH9_R)
    extrude(amount=-CUT_EXTRUDE5_DEPTH, mode=Mode.SUBTRACT)


with BuildPart() as body_2:
    # Sketch10 → Revolve1 (revolve)
    with BuildSketch(Plane(origin=(0, 0, 676.701536663), x_dir=(-1, 0, 0), z_dir=(0, 0, -1)), mode=Mode.PRIVATE) as revolve1_sk:
        Polygon((-98.733874839, 7.85), (-95.259274839, 7.85), (-95.259274839, 12.1008), (-97.759274839, 12.1008), (-97.759274839, 7.9008), (-98.733874839, 7.9008), align=None)
    revolve(revolve1_sk.sketch.rotate(Axis((95.259274839, 7.85, 676.701536663), (0, 1, 0)), 270), axis=Axis((95.259274839, 7.85, 676.701536663), (0, 1, 0)))


with BuildPart() as cut_extrude6_tool:
    # Sketch13 → Cut-Extrude6 (new, through all)
    with BuildSketch(Plane.XZ.offset(7.5)):
        with Locations(Location((95.259274839, 676.701536663, 0), (0, 0, 270))):
            Circle(SKETCH13_R)
    extrude(amount=-CUT_EXTRUDE6_DEPTH)


with BuildPart() as part_1:
    add(part.part)

    # Cut-Extrude6: cut by cut_extrude6_tool
    add(cut_extrude6_tool.part, mode=Mode.SUBTRACT)


with BuildPart() as body_2_1:
    add(body_2.part)

    # Cut-Extrude6: cut by cut_extrude6_tool
    add(cut_extrude6_tool.part, mode=Mode.SUBTRACT)


solid = Compound([part_1.part, body_2_1.part])
